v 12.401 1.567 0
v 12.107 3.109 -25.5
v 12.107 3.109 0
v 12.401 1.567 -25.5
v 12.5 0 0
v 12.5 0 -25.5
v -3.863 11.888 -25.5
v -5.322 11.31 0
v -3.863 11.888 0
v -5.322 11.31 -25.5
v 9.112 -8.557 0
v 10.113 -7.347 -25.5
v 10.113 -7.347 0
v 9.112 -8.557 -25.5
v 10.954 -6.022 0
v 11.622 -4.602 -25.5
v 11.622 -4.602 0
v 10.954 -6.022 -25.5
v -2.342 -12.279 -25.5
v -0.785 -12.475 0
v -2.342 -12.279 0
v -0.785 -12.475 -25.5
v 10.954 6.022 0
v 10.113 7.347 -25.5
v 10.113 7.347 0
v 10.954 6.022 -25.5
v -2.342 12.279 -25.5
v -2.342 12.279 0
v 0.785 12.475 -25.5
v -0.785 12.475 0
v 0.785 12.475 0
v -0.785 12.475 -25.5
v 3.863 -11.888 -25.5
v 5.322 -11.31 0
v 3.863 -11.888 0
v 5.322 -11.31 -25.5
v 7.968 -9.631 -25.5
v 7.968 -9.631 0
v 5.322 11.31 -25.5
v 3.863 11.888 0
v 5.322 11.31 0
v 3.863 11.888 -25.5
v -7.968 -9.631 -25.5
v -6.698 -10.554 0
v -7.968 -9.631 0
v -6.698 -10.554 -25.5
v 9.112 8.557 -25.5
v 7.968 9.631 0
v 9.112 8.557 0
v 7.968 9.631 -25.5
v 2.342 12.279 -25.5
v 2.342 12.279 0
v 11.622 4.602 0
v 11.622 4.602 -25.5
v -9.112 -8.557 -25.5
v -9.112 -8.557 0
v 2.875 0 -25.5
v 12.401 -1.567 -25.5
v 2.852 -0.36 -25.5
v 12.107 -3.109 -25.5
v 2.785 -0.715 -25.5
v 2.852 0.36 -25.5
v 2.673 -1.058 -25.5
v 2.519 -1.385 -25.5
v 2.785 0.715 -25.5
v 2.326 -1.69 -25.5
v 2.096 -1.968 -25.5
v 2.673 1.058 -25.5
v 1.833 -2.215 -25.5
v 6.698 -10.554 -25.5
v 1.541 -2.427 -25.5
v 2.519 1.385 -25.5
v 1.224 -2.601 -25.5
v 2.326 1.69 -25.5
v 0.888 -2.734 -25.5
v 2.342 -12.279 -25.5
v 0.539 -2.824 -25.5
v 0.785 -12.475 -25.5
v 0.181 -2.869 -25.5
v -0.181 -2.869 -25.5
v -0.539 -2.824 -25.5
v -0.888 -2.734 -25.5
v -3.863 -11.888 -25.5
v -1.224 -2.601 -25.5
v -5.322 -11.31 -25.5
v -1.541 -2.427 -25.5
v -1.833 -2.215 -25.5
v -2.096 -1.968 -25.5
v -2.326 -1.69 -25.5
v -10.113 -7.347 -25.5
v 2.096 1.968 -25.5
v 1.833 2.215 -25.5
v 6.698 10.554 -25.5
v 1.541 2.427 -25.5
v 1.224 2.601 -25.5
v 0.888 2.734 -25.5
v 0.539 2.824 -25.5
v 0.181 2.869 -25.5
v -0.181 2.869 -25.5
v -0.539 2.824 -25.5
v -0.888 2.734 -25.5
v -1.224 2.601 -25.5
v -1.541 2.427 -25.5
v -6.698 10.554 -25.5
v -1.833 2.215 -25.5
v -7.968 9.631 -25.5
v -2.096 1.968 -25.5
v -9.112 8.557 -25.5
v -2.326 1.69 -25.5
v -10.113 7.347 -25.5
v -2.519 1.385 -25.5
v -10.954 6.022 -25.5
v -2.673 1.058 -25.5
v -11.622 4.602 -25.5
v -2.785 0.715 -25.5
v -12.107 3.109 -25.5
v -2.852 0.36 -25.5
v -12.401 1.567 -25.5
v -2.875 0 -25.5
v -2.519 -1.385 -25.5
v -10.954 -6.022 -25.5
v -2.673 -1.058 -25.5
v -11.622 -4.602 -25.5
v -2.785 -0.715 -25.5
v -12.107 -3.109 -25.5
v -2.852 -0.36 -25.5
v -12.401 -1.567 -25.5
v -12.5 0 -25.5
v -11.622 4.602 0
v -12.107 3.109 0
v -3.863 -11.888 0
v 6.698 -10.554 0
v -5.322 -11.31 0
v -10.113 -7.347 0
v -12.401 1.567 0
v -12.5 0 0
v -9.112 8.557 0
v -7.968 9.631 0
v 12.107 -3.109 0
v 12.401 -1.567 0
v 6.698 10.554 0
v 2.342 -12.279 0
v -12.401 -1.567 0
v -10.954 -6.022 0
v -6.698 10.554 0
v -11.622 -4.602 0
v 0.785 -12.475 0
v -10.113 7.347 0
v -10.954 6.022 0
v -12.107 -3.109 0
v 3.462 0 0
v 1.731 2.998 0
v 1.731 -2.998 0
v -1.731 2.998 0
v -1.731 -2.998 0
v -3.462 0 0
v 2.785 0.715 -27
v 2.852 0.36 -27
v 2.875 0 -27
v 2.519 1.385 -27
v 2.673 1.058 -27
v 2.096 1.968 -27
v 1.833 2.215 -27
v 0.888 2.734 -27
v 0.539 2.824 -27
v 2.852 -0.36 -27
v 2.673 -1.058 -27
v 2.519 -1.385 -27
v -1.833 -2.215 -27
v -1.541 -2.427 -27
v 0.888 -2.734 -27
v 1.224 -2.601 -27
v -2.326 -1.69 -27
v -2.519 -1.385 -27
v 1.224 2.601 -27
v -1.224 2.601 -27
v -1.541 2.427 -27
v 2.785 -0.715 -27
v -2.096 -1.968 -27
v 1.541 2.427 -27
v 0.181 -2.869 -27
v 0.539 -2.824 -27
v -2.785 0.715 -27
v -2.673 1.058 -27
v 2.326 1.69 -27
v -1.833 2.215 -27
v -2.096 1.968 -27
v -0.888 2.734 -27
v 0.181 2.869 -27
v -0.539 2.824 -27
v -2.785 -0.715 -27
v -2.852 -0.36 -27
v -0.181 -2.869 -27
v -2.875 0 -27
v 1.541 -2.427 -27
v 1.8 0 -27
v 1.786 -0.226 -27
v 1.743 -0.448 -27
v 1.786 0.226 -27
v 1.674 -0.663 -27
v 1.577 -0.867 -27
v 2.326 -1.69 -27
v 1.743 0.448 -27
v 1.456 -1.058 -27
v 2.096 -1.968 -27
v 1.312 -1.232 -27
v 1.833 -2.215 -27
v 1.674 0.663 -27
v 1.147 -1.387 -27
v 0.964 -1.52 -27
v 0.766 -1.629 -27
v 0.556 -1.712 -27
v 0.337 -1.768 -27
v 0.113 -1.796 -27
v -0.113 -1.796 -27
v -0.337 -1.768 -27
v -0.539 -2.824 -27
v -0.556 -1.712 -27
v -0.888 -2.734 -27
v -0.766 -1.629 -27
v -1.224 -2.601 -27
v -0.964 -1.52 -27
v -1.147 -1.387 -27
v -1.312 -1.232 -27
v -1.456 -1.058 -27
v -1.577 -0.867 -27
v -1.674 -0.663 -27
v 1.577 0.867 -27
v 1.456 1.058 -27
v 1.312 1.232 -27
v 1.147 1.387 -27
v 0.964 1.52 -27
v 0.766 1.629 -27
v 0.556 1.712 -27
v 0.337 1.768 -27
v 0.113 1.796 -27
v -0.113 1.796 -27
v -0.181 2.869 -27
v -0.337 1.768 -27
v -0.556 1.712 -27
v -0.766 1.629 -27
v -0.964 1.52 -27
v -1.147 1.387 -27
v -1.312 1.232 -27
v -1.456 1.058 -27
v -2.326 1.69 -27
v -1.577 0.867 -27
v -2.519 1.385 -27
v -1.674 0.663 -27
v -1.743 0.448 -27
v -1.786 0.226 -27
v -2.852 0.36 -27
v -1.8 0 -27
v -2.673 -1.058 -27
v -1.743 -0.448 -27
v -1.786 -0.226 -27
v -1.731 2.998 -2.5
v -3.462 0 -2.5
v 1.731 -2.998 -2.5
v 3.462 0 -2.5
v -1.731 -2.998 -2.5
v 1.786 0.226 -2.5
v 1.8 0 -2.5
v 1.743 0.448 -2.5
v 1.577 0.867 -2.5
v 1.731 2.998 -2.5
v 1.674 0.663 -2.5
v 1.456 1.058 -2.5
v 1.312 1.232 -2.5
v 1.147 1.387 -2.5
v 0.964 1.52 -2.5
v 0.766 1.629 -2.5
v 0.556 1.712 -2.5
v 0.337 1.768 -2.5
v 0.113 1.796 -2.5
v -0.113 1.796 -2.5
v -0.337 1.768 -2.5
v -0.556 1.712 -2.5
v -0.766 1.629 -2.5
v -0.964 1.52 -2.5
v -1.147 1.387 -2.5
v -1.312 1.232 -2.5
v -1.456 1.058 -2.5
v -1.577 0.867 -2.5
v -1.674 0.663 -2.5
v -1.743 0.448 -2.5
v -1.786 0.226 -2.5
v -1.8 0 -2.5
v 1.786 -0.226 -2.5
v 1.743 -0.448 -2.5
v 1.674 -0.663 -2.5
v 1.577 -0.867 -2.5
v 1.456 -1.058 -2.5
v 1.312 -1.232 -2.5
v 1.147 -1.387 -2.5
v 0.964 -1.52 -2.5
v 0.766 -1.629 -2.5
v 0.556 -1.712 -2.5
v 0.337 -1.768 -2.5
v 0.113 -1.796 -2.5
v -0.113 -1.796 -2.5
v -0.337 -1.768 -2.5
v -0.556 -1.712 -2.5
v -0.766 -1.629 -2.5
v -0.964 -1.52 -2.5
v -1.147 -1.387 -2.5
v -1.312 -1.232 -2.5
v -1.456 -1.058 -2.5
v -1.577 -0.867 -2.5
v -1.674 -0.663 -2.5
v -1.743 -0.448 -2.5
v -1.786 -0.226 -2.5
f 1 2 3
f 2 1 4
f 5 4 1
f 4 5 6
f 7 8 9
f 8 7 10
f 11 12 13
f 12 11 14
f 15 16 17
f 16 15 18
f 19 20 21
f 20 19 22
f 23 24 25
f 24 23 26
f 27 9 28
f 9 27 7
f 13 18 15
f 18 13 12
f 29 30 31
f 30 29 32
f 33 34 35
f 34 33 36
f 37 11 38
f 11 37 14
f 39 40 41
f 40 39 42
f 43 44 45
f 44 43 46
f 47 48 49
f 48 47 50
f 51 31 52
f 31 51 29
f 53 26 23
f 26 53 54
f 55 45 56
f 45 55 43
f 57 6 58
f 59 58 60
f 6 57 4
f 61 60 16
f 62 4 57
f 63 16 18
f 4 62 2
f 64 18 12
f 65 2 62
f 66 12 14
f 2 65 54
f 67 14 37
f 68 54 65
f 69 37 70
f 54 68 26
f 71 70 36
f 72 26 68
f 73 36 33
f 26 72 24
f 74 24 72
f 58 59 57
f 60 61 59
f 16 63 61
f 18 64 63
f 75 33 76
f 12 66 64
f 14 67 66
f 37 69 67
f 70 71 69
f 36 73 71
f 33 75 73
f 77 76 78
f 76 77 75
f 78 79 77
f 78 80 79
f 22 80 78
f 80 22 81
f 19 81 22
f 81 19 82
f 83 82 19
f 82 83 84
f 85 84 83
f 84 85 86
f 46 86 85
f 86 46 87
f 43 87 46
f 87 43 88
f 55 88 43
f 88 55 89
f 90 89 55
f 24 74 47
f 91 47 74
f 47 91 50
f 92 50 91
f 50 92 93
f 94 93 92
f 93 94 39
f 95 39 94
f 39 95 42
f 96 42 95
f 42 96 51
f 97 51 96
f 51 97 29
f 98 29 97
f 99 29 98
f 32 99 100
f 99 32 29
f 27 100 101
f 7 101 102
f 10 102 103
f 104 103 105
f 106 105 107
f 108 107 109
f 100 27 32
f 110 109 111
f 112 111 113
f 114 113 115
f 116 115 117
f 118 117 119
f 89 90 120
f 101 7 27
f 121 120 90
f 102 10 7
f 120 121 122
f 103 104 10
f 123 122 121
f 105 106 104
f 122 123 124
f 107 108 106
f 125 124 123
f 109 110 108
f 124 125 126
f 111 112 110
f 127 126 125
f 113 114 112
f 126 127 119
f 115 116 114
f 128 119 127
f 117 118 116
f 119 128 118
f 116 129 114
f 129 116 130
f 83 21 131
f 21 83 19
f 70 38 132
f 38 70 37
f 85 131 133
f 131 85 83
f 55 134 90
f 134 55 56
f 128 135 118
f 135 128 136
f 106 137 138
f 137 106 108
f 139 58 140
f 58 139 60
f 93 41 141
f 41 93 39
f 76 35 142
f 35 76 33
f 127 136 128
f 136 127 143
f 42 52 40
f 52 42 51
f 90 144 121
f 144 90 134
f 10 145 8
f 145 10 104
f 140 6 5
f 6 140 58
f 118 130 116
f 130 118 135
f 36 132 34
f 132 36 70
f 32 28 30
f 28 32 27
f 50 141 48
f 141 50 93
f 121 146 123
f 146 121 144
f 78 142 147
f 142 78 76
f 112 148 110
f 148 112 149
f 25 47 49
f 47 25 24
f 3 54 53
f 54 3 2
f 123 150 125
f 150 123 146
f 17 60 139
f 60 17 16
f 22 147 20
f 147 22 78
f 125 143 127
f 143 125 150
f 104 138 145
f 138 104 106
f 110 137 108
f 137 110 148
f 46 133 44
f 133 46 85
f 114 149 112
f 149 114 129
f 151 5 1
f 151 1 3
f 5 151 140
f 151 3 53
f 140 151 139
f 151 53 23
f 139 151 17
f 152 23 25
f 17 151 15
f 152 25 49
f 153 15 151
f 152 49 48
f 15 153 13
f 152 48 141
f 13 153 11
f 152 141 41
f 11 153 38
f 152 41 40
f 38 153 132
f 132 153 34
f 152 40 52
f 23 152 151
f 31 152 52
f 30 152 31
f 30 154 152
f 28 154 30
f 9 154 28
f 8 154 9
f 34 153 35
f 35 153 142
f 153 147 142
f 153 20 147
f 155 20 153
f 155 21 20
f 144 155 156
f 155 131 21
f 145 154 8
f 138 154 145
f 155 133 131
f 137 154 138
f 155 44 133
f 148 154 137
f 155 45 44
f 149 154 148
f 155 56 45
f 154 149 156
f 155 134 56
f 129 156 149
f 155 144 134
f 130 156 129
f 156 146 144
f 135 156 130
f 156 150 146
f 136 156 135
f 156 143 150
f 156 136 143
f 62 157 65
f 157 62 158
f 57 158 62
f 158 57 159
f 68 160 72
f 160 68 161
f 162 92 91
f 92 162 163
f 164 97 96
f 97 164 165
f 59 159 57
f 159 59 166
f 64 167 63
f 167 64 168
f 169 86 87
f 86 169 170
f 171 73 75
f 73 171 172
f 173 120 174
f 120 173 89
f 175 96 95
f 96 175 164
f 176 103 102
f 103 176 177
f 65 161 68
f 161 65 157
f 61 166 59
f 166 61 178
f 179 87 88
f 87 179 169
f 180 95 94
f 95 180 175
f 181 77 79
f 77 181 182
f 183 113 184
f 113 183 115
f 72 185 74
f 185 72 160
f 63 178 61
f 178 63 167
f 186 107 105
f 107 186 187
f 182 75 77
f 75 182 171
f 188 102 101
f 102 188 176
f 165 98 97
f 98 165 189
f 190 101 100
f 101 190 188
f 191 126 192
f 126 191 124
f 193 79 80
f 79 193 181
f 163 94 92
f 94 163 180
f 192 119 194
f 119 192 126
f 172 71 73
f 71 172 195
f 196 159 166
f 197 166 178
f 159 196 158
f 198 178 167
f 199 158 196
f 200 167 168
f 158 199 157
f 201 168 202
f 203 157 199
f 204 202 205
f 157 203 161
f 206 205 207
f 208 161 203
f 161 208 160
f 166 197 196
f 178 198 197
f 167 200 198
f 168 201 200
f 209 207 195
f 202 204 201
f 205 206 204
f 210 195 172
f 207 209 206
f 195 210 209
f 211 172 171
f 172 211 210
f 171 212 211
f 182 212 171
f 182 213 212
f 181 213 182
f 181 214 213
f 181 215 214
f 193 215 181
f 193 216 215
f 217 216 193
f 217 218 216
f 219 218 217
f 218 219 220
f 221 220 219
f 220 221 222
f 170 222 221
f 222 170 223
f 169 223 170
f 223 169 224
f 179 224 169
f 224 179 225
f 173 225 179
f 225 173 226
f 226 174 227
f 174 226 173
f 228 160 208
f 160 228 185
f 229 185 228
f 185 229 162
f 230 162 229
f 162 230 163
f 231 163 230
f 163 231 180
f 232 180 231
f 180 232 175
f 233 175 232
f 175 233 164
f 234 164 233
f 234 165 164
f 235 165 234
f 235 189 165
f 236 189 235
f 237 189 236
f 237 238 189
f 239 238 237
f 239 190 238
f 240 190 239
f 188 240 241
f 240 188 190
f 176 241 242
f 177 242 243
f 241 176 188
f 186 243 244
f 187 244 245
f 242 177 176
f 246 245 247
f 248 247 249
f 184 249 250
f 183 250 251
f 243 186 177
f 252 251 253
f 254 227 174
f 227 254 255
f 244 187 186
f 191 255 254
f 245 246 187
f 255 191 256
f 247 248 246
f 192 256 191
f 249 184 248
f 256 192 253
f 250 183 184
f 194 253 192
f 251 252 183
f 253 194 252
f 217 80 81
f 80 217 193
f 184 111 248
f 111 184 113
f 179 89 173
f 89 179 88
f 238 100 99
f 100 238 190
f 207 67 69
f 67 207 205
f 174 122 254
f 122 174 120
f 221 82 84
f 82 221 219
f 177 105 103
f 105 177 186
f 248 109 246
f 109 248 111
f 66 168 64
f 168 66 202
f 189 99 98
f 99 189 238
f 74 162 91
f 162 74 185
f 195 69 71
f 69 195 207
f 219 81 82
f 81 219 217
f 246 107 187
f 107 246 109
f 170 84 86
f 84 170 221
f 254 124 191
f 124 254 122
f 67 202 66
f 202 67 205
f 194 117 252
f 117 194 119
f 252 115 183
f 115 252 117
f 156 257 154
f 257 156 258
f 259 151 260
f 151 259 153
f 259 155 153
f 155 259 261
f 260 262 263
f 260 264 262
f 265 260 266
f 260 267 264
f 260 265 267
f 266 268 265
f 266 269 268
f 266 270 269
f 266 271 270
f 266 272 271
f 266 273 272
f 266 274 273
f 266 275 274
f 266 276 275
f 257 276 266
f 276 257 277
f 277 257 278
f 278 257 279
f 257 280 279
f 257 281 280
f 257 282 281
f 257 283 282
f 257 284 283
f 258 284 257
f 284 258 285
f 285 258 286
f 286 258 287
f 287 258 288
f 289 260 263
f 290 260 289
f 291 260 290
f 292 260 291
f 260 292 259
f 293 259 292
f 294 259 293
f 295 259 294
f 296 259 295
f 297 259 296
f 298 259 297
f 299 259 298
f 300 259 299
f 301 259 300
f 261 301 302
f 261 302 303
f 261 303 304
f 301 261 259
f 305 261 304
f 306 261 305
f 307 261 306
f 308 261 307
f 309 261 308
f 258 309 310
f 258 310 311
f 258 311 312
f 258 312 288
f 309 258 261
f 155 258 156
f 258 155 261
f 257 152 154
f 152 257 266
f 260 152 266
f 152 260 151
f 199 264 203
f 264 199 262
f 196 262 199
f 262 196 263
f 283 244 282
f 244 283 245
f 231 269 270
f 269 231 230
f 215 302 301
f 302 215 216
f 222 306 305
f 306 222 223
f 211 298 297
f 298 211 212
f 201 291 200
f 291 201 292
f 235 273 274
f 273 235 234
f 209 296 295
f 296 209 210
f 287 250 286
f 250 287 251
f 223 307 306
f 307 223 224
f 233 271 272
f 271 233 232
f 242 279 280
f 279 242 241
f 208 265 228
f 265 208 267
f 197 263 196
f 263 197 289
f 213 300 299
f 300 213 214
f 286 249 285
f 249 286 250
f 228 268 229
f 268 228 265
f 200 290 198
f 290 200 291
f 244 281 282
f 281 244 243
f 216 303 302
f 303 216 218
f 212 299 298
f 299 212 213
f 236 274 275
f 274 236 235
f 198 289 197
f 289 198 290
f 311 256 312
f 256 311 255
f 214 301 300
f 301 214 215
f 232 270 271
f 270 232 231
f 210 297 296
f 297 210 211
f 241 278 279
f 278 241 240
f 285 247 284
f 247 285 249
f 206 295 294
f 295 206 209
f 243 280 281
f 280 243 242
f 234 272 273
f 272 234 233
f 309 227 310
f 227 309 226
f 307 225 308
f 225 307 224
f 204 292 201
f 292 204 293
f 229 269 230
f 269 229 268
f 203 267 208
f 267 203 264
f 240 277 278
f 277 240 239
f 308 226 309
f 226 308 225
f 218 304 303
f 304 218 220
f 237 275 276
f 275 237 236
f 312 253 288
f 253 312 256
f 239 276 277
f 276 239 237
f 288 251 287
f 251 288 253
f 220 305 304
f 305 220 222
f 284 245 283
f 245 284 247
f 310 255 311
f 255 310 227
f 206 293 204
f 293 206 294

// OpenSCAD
$fn = 50;

difference() {
	union() {
		translate(v = [0, 0, -25.5]) {
			cylinder(h = 25.5, r = 12.5);
		}
		#translate(v = [0, 0, -27.0]) {
			cylinder(h = 27, r = 2.875);
		}
	}
	union() {
		translate(v = [0, 0, 0]) {
			rotate(a = [0, 0, 0]) {
				difference() {
					union() {
						translate(v = [0, 0, -2.5]) {
							linear_extrude(height = 2.5) {
								polygon(points = [[3.4619999999999997, 0.0], [1.7310000000000003, 2.9981799479017264], [-1.7309999999999992, 2.9981799479017264], [-3.4619999999999997, 4.2397272186481365e-16], [-1.7310000000000014, -2.998179947901726], [1.7309999999999977, -2.9981799479017277]]);
							}
						}
					}
					union();
				}
			}
		}
		#translate(v = [0, 0, -100.0]) {
			cylinder(h = 200, r = 1.8);
		}
	}
}
